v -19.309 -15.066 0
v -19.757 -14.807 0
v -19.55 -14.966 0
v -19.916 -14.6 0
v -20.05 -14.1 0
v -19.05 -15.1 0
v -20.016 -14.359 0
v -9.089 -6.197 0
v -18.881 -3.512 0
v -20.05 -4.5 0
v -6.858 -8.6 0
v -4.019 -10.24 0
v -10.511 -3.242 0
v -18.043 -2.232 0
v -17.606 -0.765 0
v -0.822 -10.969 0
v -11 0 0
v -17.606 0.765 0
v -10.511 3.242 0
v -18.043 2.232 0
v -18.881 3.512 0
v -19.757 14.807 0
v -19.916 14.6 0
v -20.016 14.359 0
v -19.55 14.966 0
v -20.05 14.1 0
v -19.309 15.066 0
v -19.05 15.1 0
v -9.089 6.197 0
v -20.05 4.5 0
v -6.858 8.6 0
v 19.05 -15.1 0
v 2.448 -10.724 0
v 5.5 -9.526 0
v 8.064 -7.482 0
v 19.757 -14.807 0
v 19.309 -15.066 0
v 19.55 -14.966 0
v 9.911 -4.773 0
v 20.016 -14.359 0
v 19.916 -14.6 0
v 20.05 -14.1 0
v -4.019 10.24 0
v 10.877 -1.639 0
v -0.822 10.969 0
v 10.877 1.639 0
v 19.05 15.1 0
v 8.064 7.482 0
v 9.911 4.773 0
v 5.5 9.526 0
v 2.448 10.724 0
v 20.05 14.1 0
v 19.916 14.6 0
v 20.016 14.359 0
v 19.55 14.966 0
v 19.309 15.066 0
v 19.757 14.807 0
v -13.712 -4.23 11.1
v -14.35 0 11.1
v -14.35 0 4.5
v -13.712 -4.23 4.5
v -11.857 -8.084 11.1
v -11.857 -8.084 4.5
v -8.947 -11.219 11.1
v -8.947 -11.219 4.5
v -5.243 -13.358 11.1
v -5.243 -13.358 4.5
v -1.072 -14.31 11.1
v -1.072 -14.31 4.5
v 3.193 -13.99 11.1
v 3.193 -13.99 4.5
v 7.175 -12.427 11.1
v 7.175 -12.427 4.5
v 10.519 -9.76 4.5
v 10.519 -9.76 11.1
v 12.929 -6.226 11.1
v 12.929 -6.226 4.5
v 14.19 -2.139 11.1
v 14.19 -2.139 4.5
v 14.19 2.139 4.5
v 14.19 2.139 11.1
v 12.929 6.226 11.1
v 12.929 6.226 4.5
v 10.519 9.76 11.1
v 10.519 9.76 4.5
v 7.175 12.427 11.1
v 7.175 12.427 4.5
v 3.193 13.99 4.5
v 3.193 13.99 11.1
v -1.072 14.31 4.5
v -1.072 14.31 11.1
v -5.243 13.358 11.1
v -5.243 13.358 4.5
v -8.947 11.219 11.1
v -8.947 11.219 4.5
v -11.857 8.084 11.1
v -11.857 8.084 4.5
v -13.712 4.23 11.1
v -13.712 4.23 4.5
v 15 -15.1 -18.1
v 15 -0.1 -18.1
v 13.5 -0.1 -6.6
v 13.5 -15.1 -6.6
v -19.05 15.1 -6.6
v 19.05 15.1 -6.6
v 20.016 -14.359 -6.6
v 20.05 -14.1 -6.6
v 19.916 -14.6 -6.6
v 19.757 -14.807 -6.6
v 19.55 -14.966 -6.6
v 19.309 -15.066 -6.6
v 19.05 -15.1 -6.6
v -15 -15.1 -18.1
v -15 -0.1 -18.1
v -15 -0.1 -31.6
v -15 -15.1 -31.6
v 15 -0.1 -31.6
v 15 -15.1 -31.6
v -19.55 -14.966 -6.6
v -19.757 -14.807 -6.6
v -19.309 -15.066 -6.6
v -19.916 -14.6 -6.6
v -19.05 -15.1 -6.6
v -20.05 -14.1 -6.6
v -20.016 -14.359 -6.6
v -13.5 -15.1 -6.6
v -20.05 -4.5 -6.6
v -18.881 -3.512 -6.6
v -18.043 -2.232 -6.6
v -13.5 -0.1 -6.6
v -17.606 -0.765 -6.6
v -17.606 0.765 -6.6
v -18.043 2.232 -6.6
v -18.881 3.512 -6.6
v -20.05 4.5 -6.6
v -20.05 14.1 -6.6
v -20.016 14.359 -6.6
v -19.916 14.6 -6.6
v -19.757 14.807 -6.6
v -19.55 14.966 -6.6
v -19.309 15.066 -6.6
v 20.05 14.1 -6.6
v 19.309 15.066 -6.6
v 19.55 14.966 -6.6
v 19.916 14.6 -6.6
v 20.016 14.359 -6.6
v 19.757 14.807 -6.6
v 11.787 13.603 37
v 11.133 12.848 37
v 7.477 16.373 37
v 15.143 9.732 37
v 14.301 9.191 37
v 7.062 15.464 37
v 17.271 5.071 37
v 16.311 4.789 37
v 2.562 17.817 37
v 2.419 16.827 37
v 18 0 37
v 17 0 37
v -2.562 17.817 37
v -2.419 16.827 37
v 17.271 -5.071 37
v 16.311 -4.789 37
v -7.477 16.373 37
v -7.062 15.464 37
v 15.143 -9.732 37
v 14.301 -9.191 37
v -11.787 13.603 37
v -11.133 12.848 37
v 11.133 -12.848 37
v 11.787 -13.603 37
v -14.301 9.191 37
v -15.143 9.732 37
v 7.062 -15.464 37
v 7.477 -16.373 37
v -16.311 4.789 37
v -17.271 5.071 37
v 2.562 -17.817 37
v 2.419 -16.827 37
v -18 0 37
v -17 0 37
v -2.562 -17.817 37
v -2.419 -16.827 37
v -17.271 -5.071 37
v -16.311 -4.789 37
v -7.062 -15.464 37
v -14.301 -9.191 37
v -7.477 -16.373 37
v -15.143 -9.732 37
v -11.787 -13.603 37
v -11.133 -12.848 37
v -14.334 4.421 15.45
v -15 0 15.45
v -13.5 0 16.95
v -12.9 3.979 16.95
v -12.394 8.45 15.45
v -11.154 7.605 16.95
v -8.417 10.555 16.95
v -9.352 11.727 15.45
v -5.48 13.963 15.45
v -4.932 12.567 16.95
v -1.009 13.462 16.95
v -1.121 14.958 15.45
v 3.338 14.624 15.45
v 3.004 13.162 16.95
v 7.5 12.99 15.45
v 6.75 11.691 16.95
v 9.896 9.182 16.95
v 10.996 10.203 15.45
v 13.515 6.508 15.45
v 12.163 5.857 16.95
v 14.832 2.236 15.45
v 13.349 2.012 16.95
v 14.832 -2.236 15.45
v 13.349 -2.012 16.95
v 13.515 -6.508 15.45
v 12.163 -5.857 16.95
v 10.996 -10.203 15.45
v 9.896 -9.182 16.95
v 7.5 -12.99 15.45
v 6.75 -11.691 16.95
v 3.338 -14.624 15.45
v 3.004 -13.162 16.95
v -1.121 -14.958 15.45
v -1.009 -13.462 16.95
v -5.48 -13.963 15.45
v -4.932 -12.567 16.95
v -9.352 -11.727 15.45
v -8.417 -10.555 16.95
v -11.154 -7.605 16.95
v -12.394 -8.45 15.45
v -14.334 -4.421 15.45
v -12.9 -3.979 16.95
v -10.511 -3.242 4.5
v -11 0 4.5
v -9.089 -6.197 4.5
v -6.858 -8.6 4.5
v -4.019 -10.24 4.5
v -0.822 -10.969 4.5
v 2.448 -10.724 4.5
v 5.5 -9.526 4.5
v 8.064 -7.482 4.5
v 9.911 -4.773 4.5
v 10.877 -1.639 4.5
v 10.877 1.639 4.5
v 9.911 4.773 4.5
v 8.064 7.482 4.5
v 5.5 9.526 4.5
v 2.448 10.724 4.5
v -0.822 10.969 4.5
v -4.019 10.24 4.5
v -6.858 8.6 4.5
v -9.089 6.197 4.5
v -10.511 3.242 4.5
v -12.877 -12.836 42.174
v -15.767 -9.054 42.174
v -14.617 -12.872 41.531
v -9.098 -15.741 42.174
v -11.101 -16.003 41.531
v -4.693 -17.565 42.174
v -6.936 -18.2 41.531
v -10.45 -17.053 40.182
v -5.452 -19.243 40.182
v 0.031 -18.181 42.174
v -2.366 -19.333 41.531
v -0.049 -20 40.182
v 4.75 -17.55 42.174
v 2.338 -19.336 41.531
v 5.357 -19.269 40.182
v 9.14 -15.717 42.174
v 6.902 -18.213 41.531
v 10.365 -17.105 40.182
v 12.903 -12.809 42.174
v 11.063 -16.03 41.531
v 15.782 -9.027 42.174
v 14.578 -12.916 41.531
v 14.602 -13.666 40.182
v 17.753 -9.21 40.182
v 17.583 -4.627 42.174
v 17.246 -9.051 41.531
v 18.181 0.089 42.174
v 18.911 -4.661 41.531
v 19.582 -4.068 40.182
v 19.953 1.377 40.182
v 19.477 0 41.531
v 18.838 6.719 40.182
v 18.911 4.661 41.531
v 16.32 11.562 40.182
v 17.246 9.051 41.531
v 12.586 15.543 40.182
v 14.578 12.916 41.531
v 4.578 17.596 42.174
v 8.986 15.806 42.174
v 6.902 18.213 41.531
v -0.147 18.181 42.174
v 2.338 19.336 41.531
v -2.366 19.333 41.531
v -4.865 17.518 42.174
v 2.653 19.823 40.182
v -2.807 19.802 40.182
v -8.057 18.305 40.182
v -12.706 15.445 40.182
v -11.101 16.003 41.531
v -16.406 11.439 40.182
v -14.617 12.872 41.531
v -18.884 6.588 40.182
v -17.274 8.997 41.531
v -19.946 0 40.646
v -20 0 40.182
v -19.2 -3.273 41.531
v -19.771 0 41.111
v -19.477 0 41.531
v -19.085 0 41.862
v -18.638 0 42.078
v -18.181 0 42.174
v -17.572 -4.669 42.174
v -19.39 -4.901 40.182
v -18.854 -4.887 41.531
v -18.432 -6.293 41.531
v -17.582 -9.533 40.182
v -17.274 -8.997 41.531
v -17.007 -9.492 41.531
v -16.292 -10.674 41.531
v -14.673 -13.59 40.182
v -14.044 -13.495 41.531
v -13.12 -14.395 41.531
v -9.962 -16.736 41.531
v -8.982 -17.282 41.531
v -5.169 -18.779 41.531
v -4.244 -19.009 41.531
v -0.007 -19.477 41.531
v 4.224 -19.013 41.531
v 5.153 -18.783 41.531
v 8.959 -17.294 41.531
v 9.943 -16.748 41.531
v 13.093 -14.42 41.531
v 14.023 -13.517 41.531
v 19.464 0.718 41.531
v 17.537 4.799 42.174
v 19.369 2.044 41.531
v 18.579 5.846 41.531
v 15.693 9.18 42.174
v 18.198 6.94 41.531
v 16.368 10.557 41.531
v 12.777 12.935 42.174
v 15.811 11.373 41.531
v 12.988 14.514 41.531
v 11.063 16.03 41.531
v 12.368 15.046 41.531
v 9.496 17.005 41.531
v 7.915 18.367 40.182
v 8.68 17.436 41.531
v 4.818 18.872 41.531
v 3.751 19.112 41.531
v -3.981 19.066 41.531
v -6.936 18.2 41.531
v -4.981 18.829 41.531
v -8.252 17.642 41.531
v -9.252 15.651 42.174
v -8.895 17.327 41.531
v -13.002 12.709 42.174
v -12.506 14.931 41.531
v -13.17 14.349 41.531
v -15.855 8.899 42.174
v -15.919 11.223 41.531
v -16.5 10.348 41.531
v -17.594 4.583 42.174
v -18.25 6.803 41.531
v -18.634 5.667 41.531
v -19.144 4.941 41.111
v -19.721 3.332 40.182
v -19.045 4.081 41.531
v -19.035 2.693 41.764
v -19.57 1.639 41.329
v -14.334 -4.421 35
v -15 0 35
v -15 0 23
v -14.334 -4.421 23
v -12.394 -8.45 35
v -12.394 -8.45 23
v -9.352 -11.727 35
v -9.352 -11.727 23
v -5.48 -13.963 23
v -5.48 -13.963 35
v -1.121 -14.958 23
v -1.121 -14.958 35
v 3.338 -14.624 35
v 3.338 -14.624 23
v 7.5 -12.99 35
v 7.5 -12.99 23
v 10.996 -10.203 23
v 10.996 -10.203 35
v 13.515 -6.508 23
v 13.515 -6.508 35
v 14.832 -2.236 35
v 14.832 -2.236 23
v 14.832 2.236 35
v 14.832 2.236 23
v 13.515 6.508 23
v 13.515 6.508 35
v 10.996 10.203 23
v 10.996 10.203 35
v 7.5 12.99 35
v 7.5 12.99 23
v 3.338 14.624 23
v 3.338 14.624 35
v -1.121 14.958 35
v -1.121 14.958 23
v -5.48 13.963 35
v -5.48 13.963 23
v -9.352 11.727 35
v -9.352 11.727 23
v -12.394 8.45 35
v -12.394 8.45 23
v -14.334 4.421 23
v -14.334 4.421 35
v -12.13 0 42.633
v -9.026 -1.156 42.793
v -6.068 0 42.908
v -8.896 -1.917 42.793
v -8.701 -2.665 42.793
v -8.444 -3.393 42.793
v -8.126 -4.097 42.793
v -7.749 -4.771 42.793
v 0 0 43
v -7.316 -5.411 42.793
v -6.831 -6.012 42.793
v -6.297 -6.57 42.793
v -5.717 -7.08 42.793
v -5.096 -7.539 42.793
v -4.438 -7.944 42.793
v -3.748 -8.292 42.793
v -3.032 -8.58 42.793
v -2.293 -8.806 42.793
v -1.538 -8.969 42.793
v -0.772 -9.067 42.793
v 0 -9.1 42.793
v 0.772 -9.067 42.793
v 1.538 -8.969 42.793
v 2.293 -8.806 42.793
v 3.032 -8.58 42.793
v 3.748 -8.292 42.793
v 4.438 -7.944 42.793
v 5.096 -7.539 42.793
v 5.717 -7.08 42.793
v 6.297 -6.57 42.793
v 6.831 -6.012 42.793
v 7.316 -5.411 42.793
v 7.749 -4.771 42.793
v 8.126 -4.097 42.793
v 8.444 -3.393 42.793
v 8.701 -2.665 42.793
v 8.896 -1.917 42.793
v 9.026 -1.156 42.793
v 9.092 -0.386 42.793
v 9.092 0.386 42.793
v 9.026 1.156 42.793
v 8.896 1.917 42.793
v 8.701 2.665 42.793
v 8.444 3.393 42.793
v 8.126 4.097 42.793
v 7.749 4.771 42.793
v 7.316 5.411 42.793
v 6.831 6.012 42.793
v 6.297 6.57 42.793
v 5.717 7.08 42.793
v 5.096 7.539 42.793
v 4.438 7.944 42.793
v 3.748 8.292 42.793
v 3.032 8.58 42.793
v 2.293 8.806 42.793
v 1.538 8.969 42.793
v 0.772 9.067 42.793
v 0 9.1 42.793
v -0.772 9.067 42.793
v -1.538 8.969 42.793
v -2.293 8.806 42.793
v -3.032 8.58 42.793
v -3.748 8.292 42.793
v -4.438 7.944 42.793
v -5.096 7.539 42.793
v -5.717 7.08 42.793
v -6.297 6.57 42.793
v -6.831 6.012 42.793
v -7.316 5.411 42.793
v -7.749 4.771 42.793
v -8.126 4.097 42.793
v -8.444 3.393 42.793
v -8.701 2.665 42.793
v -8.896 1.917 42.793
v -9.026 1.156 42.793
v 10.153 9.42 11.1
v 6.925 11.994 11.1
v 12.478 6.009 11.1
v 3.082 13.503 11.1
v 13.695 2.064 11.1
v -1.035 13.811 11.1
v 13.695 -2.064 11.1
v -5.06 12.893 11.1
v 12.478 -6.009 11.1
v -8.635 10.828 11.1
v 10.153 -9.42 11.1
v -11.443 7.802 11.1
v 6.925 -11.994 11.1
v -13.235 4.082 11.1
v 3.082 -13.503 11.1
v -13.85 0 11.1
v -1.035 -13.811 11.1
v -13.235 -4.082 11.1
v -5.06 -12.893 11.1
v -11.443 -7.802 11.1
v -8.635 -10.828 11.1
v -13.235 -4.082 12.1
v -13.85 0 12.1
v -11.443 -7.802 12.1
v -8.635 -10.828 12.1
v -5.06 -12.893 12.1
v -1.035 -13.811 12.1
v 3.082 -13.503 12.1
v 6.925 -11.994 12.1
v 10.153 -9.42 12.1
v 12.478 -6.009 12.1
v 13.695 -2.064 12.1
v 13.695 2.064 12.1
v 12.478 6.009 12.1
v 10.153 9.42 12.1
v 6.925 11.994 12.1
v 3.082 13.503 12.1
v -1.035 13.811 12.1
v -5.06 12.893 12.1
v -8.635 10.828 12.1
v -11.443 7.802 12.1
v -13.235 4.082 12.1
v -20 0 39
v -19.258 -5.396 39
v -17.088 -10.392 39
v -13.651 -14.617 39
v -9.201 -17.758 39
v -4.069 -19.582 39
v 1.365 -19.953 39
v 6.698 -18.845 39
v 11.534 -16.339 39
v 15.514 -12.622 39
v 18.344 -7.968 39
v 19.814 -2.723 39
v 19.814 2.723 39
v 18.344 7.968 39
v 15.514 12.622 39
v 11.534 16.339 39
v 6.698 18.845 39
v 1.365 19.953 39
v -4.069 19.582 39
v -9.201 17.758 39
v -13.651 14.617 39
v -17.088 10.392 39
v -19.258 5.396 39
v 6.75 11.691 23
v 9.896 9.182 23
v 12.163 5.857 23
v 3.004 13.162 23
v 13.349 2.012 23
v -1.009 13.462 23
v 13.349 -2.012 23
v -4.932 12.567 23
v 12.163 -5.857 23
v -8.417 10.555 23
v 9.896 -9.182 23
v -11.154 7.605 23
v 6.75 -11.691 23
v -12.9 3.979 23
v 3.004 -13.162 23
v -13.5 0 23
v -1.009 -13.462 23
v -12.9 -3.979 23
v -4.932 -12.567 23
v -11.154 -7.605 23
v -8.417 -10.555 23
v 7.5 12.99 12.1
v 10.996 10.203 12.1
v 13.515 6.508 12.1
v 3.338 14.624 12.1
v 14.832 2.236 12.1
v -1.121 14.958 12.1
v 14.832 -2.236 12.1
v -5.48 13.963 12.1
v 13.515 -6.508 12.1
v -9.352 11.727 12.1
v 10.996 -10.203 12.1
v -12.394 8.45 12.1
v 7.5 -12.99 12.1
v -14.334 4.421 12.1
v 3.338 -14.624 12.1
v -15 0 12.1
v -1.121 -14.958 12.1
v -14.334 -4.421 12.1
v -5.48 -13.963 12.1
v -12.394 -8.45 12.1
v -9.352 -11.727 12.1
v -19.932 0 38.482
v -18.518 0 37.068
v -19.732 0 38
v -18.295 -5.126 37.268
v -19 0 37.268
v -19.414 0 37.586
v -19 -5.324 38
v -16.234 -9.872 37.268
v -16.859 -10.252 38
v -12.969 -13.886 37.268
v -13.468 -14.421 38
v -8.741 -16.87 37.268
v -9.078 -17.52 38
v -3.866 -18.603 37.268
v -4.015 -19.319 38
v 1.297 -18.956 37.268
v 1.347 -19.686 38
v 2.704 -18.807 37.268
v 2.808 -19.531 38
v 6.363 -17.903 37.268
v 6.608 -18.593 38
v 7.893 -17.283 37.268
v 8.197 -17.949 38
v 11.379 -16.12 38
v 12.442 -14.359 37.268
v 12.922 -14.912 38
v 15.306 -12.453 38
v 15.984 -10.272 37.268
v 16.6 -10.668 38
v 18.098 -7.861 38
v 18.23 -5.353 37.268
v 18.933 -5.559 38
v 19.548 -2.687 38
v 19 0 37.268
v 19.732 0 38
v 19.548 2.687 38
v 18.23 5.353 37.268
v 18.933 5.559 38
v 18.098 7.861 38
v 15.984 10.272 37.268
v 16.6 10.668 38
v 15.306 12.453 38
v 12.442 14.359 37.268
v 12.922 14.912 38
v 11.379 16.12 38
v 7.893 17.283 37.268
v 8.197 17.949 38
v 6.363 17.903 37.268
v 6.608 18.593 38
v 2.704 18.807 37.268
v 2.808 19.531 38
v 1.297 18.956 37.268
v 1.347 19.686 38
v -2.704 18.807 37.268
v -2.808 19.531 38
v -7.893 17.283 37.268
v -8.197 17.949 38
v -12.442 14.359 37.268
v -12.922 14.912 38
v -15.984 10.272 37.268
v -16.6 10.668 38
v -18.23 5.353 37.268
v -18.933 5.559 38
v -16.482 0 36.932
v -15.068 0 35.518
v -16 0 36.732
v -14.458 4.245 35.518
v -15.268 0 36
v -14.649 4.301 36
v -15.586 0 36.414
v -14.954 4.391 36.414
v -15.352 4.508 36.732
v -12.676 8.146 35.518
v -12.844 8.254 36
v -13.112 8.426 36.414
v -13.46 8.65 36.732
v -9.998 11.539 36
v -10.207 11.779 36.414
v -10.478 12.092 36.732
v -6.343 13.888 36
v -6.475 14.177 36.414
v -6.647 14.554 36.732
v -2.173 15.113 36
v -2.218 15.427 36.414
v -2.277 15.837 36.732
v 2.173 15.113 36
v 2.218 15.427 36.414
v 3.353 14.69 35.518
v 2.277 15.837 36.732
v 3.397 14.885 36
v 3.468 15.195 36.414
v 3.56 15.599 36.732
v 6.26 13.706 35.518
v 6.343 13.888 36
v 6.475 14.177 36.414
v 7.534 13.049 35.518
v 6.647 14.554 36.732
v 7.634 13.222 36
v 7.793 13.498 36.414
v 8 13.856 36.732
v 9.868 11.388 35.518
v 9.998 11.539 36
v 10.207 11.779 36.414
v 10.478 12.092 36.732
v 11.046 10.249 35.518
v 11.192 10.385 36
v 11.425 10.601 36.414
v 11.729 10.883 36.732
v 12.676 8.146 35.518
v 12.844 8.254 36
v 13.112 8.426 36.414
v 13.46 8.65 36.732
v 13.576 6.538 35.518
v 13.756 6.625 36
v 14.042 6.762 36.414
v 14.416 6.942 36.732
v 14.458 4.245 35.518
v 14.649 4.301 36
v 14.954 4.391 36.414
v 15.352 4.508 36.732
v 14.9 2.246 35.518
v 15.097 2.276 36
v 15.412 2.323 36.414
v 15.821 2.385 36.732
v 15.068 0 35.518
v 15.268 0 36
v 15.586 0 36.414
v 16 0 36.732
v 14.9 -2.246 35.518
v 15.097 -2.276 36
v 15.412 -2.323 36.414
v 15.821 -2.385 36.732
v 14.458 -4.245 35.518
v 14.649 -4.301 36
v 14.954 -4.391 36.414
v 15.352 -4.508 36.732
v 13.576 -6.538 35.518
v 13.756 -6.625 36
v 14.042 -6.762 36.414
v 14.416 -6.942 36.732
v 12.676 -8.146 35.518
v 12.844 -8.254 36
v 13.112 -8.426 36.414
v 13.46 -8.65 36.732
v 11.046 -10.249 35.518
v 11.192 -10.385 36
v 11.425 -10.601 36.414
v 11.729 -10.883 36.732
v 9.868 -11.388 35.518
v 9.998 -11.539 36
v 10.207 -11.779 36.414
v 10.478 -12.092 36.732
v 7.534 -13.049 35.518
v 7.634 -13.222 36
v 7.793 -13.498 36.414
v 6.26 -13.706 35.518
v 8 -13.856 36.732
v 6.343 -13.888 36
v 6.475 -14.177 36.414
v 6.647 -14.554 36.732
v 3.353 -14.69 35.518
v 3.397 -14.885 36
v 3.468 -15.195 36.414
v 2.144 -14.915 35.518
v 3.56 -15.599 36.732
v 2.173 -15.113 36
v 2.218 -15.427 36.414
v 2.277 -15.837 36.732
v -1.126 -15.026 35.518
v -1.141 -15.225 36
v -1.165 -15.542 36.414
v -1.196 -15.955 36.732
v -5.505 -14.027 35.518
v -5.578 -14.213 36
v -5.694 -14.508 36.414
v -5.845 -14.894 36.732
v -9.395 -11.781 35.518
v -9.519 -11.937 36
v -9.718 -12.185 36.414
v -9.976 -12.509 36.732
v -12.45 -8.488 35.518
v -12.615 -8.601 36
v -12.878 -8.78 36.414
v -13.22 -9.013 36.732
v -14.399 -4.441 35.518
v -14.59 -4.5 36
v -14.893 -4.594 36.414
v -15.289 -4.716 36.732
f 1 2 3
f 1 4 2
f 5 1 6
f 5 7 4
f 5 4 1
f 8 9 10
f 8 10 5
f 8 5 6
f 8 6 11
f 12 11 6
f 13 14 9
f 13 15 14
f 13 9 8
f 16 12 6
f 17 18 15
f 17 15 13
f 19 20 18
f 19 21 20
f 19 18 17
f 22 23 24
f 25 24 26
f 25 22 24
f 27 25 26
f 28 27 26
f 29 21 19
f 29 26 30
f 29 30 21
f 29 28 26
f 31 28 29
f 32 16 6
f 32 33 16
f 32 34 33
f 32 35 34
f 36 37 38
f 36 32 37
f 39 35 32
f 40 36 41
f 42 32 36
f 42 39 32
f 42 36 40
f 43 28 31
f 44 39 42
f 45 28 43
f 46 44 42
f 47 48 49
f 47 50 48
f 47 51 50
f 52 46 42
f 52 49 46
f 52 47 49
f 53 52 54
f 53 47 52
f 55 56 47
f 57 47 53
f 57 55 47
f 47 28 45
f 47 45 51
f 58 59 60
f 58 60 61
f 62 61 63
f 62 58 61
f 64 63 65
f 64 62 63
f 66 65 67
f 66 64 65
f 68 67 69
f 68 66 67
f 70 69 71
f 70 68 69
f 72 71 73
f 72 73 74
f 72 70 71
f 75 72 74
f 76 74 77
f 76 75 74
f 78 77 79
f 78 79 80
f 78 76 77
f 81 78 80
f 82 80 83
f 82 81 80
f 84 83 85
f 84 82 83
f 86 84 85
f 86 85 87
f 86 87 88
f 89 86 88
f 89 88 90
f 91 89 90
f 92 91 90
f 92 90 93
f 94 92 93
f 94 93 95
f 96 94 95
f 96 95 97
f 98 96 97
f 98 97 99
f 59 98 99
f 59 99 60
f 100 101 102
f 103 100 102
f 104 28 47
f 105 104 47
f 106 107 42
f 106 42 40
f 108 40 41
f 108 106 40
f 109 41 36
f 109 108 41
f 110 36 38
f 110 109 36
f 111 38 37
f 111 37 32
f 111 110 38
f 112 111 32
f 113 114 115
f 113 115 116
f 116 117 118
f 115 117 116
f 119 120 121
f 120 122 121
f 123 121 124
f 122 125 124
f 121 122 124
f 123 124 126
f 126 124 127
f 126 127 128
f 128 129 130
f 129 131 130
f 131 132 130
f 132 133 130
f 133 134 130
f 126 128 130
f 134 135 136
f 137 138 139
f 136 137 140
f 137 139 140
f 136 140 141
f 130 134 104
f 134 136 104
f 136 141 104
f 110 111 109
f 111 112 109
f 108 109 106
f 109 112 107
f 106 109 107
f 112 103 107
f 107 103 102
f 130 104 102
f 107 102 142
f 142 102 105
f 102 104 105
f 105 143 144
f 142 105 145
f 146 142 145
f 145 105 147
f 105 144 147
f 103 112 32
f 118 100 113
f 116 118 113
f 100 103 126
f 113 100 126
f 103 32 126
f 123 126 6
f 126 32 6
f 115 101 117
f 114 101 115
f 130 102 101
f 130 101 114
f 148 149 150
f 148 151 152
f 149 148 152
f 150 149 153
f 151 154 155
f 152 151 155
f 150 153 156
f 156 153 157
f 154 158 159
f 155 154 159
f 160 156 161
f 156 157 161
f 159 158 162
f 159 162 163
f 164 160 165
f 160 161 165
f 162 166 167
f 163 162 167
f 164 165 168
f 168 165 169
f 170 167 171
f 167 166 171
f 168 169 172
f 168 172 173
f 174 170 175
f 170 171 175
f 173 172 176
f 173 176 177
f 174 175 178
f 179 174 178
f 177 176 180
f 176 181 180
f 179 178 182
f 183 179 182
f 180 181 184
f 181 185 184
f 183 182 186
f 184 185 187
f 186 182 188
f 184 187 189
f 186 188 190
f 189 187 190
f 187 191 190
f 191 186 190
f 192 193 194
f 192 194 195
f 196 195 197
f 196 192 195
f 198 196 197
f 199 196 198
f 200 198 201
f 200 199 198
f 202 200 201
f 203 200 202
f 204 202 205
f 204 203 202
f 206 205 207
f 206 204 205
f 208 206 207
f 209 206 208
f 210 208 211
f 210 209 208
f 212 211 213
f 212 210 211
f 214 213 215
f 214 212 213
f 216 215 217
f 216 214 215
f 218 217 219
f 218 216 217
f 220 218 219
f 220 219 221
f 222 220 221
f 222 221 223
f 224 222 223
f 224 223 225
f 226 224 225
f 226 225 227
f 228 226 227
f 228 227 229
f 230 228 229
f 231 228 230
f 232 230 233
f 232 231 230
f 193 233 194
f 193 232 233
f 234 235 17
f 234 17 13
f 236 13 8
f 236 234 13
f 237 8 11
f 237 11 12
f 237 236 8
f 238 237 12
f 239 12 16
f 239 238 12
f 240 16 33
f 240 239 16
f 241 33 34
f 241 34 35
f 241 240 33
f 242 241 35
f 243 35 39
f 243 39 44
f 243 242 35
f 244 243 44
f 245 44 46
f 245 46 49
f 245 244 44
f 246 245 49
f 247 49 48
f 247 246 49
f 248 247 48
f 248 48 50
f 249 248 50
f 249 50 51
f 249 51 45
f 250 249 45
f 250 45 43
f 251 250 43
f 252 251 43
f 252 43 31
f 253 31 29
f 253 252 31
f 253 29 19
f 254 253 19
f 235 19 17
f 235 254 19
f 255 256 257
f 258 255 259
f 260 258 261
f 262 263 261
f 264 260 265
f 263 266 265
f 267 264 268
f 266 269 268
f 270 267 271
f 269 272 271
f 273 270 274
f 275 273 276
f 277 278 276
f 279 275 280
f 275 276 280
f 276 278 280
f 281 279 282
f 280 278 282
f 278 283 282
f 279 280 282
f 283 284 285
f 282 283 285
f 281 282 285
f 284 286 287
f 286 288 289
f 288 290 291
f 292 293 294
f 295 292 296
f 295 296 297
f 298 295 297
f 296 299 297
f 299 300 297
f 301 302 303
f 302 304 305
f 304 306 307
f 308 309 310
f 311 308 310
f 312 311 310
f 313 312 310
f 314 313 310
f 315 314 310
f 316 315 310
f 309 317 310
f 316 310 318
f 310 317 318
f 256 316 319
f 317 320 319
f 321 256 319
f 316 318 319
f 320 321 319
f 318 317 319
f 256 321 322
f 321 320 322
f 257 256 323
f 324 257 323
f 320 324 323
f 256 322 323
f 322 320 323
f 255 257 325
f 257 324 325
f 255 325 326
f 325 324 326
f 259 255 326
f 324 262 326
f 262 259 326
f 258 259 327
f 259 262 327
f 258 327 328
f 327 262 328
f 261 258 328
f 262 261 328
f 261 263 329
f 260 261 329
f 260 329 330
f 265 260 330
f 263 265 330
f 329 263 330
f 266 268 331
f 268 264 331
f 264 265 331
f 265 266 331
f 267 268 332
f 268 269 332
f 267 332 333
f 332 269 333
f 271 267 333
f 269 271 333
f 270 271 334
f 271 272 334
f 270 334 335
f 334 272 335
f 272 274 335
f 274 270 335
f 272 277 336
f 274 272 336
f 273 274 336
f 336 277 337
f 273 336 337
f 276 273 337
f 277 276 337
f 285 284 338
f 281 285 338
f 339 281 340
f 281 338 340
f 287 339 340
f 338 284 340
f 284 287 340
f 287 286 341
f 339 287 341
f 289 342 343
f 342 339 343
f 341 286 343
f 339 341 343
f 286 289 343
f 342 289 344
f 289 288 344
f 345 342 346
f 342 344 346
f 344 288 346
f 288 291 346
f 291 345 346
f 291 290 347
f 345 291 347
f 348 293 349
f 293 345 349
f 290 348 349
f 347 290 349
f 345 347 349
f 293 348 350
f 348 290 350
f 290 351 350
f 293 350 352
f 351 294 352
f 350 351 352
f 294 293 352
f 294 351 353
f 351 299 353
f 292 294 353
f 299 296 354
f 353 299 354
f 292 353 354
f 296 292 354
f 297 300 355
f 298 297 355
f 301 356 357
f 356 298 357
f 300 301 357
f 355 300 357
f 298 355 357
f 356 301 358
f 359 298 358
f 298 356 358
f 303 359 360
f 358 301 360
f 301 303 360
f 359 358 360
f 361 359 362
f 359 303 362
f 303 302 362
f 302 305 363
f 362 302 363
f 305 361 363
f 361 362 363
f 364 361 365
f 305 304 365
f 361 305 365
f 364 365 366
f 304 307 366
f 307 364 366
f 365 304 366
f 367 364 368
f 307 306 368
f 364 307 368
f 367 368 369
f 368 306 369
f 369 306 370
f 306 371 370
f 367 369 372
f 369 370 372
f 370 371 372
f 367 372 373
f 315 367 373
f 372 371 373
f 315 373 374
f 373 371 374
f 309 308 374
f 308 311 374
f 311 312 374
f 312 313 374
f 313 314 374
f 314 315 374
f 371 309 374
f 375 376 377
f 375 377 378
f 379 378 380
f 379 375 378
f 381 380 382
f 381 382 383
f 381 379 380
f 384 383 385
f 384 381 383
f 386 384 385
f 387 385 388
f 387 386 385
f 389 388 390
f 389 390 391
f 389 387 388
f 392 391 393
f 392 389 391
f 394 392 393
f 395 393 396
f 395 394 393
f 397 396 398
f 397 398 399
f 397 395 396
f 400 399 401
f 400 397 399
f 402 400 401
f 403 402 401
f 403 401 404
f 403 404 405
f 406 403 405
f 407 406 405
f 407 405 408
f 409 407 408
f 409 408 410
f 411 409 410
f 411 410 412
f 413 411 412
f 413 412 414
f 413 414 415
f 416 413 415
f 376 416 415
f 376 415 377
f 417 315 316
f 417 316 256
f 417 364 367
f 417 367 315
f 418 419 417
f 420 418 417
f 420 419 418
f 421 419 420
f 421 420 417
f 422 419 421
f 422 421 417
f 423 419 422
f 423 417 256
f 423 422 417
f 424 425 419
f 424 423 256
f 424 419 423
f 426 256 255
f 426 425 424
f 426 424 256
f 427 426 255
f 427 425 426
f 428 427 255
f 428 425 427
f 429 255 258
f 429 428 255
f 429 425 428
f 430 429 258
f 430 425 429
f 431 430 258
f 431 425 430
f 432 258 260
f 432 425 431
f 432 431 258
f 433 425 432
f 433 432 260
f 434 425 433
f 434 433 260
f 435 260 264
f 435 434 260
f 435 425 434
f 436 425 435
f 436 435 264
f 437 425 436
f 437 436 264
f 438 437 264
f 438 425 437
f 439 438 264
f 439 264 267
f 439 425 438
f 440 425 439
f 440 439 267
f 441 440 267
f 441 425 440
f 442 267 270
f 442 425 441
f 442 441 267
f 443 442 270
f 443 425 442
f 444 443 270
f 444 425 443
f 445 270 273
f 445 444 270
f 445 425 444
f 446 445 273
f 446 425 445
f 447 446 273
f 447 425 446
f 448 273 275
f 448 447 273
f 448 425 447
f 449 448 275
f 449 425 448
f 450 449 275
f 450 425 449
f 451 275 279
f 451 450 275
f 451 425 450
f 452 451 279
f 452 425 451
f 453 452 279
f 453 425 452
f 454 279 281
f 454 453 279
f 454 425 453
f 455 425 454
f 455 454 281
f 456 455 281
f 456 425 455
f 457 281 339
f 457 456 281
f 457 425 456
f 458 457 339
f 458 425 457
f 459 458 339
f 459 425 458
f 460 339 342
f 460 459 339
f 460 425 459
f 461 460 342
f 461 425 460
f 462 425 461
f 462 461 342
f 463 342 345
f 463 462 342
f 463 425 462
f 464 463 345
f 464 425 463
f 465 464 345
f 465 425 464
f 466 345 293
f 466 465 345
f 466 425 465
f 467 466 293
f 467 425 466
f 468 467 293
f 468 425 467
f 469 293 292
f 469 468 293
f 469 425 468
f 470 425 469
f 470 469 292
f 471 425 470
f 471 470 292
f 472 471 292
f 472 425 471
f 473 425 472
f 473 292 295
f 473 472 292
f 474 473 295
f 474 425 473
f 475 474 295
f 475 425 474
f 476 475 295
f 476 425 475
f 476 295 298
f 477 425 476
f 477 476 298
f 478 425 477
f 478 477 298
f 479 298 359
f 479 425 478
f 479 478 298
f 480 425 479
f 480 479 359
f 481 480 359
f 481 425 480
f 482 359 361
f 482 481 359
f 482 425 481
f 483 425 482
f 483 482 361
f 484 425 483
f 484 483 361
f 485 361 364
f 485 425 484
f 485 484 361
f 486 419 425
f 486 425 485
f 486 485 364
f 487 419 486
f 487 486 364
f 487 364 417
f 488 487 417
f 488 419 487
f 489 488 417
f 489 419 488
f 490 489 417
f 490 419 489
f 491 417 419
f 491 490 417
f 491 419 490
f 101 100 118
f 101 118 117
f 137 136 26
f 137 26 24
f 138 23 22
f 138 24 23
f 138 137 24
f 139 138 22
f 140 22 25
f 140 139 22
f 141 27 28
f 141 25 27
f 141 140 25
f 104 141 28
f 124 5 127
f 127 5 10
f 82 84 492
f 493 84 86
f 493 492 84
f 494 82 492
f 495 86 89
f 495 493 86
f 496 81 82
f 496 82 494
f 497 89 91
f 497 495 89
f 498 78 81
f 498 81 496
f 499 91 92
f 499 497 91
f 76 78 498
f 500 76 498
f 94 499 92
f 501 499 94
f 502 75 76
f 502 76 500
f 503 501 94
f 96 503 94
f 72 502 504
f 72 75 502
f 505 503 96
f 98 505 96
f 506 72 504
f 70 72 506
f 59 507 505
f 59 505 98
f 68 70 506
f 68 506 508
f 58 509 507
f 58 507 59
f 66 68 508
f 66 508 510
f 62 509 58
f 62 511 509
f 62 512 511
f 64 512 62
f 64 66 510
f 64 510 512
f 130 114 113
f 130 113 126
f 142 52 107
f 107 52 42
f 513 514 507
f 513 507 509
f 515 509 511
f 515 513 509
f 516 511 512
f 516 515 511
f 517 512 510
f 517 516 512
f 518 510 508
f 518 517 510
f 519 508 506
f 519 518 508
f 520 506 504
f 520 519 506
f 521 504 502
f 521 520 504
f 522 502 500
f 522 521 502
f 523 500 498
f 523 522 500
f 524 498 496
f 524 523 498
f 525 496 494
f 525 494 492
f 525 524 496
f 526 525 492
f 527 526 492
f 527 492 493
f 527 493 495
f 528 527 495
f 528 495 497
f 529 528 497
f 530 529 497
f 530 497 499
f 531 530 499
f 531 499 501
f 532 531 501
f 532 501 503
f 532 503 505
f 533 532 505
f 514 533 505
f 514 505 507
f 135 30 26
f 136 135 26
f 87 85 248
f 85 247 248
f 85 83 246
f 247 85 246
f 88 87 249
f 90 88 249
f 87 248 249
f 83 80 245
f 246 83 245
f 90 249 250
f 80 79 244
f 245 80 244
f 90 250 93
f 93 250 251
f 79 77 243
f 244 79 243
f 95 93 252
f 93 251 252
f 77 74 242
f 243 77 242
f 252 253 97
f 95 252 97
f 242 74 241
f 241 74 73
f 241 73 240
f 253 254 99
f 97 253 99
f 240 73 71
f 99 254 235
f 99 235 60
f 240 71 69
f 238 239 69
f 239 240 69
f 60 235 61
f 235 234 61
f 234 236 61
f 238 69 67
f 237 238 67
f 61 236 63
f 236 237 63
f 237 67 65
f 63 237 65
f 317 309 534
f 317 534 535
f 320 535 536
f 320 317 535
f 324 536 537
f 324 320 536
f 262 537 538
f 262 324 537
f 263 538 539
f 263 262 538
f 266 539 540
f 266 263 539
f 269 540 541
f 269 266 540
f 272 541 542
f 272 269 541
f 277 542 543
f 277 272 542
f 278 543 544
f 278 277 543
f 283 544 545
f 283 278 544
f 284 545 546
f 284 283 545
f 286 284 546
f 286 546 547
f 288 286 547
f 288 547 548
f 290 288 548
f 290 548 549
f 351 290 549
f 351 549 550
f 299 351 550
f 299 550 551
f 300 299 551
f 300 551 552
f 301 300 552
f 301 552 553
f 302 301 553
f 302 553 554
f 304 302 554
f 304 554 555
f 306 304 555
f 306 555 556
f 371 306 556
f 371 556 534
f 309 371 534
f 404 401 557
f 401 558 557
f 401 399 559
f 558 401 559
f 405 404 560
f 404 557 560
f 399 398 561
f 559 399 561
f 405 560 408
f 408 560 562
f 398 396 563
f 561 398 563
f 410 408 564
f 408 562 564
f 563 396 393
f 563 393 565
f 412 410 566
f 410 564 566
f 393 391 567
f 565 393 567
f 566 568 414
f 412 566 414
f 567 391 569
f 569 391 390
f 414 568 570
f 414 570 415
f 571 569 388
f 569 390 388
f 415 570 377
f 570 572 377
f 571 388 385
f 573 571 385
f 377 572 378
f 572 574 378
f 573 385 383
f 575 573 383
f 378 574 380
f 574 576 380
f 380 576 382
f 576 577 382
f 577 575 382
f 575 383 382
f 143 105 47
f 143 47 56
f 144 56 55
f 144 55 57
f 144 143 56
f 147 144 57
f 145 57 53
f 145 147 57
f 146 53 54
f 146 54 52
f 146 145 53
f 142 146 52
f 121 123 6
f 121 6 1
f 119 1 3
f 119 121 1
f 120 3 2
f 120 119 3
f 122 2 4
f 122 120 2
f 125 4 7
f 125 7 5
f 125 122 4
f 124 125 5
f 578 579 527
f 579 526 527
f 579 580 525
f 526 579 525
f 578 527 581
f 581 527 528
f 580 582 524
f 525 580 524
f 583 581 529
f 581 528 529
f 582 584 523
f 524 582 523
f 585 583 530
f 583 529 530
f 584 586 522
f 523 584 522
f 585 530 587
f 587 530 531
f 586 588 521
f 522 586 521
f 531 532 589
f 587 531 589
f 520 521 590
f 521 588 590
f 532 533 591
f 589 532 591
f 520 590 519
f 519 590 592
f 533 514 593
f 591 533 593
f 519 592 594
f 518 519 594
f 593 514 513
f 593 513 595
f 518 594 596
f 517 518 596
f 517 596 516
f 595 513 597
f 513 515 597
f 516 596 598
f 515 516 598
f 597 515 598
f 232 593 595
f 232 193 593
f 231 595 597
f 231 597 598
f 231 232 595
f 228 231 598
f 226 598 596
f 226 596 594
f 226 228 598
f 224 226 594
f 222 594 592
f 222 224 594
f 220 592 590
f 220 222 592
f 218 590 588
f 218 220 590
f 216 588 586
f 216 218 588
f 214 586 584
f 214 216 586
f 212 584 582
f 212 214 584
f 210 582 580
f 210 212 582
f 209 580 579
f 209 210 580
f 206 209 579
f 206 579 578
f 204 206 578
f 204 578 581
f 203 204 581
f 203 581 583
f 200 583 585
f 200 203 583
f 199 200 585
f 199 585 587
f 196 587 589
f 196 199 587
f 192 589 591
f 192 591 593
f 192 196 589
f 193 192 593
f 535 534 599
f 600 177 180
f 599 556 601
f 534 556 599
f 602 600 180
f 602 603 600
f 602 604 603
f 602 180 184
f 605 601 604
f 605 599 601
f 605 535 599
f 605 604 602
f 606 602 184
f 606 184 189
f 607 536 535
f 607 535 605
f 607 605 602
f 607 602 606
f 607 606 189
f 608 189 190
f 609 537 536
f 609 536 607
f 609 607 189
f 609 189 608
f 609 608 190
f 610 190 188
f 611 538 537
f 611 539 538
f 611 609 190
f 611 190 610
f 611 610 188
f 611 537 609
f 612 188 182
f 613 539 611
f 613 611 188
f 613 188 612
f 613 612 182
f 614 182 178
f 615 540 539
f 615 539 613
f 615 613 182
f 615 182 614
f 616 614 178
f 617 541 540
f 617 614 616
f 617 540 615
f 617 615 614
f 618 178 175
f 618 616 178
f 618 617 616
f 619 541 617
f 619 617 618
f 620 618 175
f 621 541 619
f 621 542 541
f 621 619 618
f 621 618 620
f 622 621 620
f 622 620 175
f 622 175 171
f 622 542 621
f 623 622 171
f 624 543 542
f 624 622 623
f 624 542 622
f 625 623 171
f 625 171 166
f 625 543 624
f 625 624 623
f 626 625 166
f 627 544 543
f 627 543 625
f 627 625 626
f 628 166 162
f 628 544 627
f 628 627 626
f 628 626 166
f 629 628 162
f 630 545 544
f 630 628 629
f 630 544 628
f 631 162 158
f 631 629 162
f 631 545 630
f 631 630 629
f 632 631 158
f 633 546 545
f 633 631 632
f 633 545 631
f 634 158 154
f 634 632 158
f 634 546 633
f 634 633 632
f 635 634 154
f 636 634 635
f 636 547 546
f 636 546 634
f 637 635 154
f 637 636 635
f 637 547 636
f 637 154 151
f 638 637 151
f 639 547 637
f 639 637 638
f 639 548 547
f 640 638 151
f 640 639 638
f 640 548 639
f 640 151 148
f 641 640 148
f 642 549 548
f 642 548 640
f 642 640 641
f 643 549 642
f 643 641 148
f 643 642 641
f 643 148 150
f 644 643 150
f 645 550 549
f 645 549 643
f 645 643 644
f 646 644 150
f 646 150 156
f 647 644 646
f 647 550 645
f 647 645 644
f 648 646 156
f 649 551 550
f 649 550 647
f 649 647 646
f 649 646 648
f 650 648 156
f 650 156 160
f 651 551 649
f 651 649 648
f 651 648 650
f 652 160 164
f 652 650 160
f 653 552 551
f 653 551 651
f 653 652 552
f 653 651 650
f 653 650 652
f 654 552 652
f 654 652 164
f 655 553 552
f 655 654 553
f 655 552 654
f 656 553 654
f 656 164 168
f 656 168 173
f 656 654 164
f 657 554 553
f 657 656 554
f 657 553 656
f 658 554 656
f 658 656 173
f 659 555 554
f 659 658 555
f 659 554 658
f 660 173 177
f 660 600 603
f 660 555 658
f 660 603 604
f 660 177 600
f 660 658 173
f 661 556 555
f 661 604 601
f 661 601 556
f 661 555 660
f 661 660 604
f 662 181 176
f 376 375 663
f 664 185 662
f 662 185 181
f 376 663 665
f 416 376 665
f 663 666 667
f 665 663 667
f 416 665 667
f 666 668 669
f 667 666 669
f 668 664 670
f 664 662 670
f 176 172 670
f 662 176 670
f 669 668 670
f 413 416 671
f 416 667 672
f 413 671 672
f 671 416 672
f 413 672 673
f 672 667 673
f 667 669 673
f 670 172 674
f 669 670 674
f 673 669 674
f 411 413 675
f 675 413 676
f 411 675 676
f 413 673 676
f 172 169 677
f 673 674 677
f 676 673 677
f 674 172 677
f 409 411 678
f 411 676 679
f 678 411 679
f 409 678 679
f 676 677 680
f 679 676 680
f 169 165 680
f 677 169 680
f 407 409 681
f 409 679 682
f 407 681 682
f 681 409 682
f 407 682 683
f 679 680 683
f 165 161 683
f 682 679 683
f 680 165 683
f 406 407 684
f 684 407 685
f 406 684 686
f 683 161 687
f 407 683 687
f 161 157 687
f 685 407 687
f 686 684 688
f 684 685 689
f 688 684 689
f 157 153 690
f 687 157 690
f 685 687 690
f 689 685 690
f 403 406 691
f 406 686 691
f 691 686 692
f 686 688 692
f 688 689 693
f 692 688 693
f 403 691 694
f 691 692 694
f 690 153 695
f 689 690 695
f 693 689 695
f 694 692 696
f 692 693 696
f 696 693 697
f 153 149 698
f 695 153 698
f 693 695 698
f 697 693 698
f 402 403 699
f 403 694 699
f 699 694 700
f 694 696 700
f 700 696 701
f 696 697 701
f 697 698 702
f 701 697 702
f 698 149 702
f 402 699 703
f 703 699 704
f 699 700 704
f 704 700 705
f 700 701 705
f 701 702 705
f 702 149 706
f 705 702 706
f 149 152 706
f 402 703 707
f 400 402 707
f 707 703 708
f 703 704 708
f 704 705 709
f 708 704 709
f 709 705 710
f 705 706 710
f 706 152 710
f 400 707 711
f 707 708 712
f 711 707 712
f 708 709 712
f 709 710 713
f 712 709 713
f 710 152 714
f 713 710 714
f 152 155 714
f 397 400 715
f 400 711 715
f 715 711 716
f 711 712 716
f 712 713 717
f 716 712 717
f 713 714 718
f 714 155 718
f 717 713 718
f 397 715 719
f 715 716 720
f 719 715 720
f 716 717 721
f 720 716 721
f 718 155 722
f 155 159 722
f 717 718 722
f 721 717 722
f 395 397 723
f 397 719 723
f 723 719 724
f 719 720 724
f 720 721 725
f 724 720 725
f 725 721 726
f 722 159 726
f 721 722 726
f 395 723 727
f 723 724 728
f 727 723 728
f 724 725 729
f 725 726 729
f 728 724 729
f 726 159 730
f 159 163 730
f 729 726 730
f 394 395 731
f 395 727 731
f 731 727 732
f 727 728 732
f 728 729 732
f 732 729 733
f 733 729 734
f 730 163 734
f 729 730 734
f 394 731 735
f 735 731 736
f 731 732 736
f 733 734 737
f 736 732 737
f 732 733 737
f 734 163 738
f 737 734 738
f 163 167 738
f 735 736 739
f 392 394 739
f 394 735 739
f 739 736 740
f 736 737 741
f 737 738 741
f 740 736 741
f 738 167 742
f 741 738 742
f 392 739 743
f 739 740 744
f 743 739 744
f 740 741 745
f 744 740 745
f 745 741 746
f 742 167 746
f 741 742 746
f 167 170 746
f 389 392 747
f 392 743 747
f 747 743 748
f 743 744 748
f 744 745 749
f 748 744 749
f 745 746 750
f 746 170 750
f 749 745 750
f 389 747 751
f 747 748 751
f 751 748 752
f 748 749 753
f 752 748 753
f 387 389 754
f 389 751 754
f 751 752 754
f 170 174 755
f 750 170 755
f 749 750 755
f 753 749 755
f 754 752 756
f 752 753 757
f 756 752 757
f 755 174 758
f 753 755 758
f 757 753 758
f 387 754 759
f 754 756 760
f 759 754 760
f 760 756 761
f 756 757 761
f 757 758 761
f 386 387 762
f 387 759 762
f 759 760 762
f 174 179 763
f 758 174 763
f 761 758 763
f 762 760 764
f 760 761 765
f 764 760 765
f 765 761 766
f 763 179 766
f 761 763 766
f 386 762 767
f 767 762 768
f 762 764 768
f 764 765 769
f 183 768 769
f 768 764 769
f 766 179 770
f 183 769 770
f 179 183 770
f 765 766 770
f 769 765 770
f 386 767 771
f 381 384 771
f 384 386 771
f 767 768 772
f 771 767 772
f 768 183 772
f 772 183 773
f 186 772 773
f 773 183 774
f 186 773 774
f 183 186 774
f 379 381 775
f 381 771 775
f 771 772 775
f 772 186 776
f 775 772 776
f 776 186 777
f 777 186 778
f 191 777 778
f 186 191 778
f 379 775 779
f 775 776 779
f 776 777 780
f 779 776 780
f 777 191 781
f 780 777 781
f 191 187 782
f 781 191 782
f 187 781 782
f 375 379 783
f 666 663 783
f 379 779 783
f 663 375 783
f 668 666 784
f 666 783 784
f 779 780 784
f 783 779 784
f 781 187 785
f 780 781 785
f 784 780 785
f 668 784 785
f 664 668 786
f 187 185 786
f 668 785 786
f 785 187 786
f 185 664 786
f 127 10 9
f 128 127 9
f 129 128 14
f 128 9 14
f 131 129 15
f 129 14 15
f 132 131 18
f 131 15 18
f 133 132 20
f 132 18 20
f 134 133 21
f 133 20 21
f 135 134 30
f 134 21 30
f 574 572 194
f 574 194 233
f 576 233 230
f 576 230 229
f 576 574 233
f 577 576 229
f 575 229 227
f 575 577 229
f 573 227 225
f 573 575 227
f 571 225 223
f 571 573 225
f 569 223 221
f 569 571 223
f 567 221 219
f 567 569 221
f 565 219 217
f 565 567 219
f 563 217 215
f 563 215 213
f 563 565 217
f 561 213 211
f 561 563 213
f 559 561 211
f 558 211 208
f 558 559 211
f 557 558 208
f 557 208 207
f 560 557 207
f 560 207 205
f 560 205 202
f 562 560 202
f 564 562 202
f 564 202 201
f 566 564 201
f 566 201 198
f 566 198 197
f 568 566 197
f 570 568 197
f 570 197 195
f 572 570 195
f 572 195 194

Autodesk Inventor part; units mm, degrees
ref_plane "YZ Plane" through (0, 0, 0) normal (1, 0, 0) x (0, 1, 0)
ref_plane "XZ Plane" through (0, 0, 0) normal (0, 1, 0) x (-1, 0, 0)
ref_plane "XY Plane" through (0, 0, 0) normal (0, 0, 1) x (1, 0, 0)
sketch "Sketch1" plane through (0, 0, 0) normal (0, 0, 1) x (1, 0, 0)
  line L0 (-20.05, 15.1) -> (20.05, 15.1)
  line L1 (20.05, 15.1) -> (20.05, -15.1)
  line L2 (20.05, -15.1) -> (-20.05, -15.1)
  line L3 (-20.05, -15.1) -> (-20.05, 15.1)
  line L4 (-20.05, 15.1) -> (20.05, -15.1) construction
  line L5 (20.05, 15.1) -> (-20.05, -15.1) construction
  arc A0 (-20.05, -4.5) -> (-20.05, 4.5) centre (-22.85, 0) ccw
  line L6 (-22.85, 0) -> (-17.55, 0) construction
  line L7 (-17.55, 0) -> (0, 0) construction
  dimension "d0" = 40.1
  dimension "d1" = 30.2
  dimension "d2" = 2.5
  dimension "d3" = 9
extrude "Extrusion1" add sketch "Sketch1" against normal blind 6.6 contours L0 L1 L2 L3 A0
sketch "Sketch2" plane through (0, 0, -6.6) normal (0, 0, -1) x (-1, 0, 0)
  line L0 (-15, -0.1) -> (15, -0.1)
  line L1 (15, -0.1) -> (15, -15.1)
  line L2 (15, -15.1) -> (-15, -15.1)
  line L3 (-15, -15.1) -> (-15, -0.1)
  line L4 (-15, -0.1) -> (15, -15.1) construction
  line L5 (15, -0.1) -> (-15, -15.1) construction
  line L6 (-20.05, -15.1) -> (20.05, -15.1) projected
  point P0 (0, 0)
  point P1 (0, -7.6)
  point P2 (0, -15.1)
  dimension "d6" = 30
  dimension "d7" = 15
extrude "Extrusion2" add sketch "Sketch2" along normal blind 25
sketch "Sketch3" plane through (0, 0, 0) normal (0, 1, 0) x (-1, 0, 0)
  line L0 (0, 0) -> (0, 43)
  line L1 (0, 0) -> (11, 0)
  line L2 (11, 0) -> (11, 4.5)
  line L3 (11, 4.5) -> (14.35, 4.5)
  line L4 (14.35, 4.5) -> (14.35, 11.1)
  line L5 (14.35, 11.1) -> (13.85, 11.1)
  line L6 (13.85, 11.1) -> (13.85, 12.1)
  line L7 (13.85, 12.1) -> (15, 12.1)
  line L8 (15, 12.1) -> (15, 15.45)
  line L9 (15, 15.45) -> (13.5, 16.95)
  line L10 (13.5, 16.95) -> (13.5, 23)
  line L11 (13.5, 23) -> (15, 23)
  line L12 (15, 23) -> (15, 37)
  line L13 (15, 37) -> (20, 37)
  line L14 (20, 37) -> (20, 42)
  line L15 (20, 43) -> (0, 43) construction
  arc A0 (20, 42) -> (0, 43) centre (0, -157.5) ccw
  line L16 (20, 42) -> (20, 43) construction
  dimension "d10" = 22
  dimension "d11" = 4.5
  dimension "d12" = 28.7
  dimension "d13" = 6.6
  dimension "d14" = 3.35
  dimension "d15" = 30
  dimension "d16" = 0.5
  dimension "d17" = 1
  dimension "d18" = 27
  dimension "d19" = 30
  dimension "d20" = 40
  dimension "d21" = 6
  dimension "d22" = 20
  dimension "d23" = 43
  dimension "d24" = 45
  dimension "d26" = 1
revolve "Revolution1" add sketch "Sketch3" angle 360 about axis through (0, 0, 0) along (0, 0, 1)
fillet "Fillet1" radius 2 3 edges at (20, 0, 42) (20, 0, 37) (15, 0, 37)
fillet "Fillet2" radius 1 4 edges at (20.05, -15.1, -3.3) (20.05, 15.1, -3.3) (-20.05, 15.1, -3.3) (-20.05, -15.1, -3.3)
sketch "Sketch4" plane through (-15, -0.1, -6.6) normal (0, 1, 0) x (1, 0, 0)
  line L0 (30, 0) -> (0, 0) projected
  line L1 (30, 0) -> (30, 25) projected
  line L2 (0, 25) -> (30, 25) projected
  line L3 (0, 0) -> (0, 25) projected
  line L4 (30, 0) -> (30, 25) projected
  line L5 (30, 11.5) -> (28.5, 0)
  line L6 (0, 11.5) -> (1.5, 0)
  line L7 (0, 25) -> (30, 25) construction
  line L8 (15, 25) -> (15, 0) construction
  point P0 (15, -6.6)
  dimension "d29" = 27
  dimension "d30" = 11.5
extrude "Extrusion3" cut sketch "Sketch4" against normal through all contours L0 L5 L1 | L0 L3 L6
properties part number "emergency-button" material "ABS Plastic"
